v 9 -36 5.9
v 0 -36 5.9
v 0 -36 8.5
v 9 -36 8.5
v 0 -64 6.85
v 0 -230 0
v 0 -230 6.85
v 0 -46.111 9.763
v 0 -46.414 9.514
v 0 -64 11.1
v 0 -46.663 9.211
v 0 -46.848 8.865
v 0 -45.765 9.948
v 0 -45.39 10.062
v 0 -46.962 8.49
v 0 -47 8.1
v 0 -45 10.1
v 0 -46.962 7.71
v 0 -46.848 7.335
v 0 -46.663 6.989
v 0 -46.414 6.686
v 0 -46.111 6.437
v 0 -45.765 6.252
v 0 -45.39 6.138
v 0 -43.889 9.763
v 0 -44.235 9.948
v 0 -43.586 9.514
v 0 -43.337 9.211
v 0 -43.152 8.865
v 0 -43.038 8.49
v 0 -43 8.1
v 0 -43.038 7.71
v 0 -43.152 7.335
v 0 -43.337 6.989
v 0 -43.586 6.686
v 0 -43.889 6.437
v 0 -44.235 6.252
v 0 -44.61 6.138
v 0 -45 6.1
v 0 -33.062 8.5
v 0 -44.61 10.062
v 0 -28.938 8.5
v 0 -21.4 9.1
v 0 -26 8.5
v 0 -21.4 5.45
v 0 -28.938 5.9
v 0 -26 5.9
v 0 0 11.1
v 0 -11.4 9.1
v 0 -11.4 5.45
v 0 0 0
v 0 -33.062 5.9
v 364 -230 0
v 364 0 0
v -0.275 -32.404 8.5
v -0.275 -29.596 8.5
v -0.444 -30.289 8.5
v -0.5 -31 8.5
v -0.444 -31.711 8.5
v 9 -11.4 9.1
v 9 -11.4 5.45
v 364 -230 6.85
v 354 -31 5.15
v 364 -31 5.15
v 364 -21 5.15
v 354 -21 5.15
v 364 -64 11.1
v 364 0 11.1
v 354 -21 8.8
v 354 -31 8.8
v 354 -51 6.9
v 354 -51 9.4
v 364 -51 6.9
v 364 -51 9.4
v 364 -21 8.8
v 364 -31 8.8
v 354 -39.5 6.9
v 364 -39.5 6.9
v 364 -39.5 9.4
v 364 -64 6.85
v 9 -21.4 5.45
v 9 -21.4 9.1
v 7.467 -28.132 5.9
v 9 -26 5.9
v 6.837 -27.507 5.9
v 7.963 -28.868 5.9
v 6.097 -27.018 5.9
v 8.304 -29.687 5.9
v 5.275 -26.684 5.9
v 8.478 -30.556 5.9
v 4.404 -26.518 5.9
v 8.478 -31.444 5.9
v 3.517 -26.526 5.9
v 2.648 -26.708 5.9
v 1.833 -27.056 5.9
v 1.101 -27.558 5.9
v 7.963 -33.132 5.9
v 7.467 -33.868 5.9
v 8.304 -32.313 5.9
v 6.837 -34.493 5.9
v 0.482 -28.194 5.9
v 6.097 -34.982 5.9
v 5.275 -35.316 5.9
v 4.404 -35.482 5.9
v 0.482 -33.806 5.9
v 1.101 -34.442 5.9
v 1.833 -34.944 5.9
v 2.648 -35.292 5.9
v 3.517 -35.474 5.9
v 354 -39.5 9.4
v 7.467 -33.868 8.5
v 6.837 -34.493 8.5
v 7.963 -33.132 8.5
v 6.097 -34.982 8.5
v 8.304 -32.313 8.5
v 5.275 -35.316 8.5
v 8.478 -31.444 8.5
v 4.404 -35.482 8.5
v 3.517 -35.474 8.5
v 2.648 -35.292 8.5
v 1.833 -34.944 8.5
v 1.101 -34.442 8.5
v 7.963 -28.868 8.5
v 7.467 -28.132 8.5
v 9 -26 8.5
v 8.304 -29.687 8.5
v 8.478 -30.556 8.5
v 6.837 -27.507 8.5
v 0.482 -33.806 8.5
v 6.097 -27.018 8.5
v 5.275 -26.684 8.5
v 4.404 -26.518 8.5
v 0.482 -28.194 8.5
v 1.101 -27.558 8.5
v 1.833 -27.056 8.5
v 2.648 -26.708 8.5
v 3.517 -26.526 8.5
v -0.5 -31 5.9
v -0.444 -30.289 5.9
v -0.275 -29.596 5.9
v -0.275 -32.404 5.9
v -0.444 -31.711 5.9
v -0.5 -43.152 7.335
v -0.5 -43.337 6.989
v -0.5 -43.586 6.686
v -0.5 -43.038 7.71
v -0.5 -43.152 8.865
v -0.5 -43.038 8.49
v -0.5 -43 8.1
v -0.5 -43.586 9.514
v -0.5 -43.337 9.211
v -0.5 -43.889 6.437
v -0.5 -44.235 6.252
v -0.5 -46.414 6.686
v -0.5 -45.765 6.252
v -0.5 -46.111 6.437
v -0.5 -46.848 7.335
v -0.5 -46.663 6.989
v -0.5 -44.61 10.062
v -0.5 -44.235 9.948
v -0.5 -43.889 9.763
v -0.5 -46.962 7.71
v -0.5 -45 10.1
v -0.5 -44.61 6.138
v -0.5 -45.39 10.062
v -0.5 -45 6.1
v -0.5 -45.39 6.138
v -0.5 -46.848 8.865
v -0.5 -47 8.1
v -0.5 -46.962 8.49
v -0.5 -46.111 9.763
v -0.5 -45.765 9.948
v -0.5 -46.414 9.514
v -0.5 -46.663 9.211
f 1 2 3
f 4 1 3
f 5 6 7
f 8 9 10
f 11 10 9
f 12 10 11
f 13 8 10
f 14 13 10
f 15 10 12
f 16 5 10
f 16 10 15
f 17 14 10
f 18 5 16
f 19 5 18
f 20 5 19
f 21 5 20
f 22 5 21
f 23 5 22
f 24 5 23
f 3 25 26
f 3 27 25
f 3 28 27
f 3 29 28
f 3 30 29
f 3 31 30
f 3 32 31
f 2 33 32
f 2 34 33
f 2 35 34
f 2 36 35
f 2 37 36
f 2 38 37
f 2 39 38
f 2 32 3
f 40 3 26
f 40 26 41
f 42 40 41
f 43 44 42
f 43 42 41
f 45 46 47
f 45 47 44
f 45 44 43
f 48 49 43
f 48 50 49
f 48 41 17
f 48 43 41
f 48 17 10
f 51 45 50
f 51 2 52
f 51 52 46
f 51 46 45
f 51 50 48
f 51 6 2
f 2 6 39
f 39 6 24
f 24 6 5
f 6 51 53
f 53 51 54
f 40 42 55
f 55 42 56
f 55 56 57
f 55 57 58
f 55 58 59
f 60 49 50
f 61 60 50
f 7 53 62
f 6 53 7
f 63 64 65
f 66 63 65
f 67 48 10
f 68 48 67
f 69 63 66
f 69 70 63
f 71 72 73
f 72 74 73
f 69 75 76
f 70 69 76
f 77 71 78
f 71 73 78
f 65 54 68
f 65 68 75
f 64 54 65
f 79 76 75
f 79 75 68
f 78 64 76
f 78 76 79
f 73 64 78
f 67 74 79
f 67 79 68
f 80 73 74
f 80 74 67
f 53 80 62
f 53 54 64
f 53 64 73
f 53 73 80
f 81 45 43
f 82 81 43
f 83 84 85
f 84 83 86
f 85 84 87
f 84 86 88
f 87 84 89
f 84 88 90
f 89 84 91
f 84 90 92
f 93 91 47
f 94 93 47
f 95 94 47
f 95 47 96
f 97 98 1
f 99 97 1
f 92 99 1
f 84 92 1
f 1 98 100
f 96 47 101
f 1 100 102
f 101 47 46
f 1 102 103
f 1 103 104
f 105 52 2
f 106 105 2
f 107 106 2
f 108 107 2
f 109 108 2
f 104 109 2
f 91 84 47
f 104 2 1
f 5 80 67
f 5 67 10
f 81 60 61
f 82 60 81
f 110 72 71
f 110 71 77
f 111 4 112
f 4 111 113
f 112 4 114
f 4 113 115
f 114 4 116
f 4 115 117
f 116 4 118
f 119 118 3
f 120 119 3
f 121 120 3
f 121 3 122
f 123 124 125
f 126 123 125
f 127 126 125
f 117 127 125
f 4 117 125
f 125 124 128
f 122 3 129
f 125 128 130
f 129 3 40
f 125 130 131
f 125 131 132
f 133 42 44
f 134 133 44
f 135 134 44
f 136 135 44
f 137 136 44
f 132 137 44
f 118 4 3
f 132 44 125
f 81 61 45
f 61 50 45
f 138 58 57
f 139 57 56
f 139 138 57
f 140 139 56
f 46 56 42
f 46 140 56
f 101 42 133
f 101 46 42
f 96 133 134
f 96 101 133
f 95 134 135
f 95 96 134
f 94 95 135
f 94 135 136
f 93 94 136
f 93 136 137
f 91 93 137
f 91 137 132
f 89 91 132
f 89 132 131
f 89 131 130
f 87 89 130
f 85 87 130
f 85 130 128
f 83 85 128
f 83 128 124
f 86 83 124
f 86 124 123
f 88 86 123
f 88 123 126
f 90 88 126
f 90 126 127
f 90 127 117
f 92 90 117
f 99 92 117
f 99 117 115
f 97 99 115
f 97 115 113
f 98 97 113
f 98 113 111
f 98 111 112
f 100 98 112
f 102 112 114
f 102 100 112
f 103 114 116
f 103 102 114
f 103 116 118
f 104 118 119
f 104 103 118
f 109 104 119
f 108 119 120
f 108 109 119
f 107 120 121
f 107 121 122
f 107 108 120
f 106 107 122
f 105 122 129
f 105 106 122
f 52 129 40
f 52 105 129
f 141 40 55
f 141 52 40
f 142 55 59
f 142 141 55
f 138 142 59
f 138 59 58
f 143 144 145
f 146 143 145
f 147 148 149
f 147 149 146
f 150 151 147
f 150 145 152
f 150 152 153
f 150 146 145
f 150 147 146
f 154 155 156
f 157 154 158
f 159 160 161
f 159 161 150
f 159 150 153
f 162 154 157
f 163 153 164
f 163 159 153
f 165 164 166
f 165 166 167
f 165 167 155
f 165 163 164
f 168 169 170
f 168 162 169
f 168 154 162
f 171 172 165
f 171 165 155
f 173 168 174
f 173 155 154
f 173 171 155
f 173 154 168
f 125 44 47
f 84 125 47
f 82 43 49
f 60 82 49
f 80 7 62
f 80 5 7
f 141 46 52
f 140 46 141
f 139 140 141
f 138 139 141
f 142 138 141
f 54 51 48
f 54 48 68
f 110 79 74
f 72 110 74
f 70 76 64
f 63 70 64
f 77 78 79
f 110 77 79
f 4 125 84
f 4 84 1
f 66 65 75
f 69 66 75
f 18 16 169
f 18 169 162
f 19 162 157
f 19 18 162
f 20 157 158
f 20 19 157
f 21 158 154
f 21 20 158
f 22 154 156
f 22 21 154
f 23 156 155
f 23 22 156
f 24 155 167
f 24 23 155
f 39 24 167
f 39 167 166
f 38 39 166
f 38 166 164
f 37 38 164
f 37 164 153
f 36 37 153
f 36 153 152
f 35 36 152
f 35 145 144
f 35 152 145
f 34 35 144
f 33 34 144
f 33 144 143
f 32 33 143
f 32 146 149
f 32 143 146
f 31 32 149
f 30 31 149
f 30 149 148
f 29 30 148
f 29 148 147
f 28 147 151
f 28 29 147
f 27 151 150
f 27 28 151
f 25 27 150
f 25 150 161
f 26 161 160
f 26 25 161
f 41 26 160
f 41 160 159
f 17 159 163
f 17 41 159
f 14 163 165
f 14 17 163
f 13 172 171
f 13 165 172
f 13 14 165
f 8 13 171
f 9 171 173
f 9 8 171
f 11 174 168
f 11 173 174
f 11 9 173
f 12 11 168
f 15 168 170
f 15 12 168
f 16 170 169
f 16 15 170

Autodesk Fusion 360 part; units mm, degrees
sketch "Sketch1" plane through (0, 0, 0) normal (0, 0, 1) x (1, 0, 0)
  line L0 (0, 0) -> (364, 0)
  line L1 (364, 0) -> (364, -230)
  line L2 (364, -230) -> (0, -230)
  line L3 (0, -230) -> (0, 0)
  line L4 (364, -64) -> (0, -64)
extrude "Extrude1" add sketch "Sketch1" along normal blind 6.85 contours L1 L2 L3 L4
extrude "Extrude2" add sketch "Sketch1" along normal blind 11.1 contours L0 L1 L3 L4
sketch "Sketch2" plane through (0, 0, 0) normal (-1, 0, 0) x (0, -1, 0)
  line L0 (0, 0) -> (230, 0)
  line L1 (230, 0) -> (230, 6.85)
  line L2 (230, 6.85) -> (64, 6.85)
  line L3 (64, 6.85) -> (64, 11.1)
  line L4 (64, 11.1) -> (0, 11.1)
  line L5 (0, 11.1) -> (0, 0)
  circle A0 centre (45, 8.1) radius 2
  line L6 (36, 8.5) -> (26, 8.5)
  line L7 (26, 8.5) -> (26, 5.9)
  line L8 (26, 5.9) -> (36, 5.9)
  line L9 (36, 5.9) -> (36, 8.5)
  line L10 (21.4, 9.1) -> (11.4, 9.1)
  line L11 (11.4, 9.1) -> (11.4, 5.45)
  line L12 (11.4, 5.45) -> (21.4, 5.45)
  line L13 (21.4, 5.45) -> (21.4, 9.1)
  dimension "d10" = 4
extrude "Extrude3" add sketch "Sketch2" along normal blind 0.5 contours A0
extrude "Extrude4" cut sketch "Sketch2" against normal blind 9 contours L6 L7 L8 L9 | L10 L11 L12 L13
sketch "Sketch3" plane through (0, 0, 5.9) normal (0, 0, 1) x (-1, 0, 0)
  line L0 (0, 26) -> (0, 36)
  line L1 (0, 36) -> (-9, 36)
  line L2 (-9, 36) -> (-9, 26)
  line L3 (-9, 26) -> (0, 26)
  circle A0 centre (-4, 31) radius 4.5
extrude "Extrude5" add sketch "Sketch3" along normal blind 2.6 contours L0 A0 | L0 A0
sketch "Sketch4" plane through (364, 0, 0) normal (1, 0, 0) x (0, 1, 0)
  line L0 (-230, 0) -> (0, 0)
  line L1 (0, 0) -> (0, 11.1)
  line L2 (0, 11.1) -> (-64, 11.1)
  line L3 (-64, 11.1) -> (-64, 6.85)
  line L4 (-64, 6.85) -> (-230, 6.85)
  line L5 (-230, 6.85) -> (-230, 0)
  line L6 (-21, 8.8) -> (-31, 8.8)
  line L7 (-31, 8.8) -> (-31, 5.15)
  line L8 (-31, 5.15) -> (-21, 5.15)
  line L9 (-21, 5.15) -> (-21, 8.8)
  line L10 (-39.5, 9.4) -> (-51, 9.4)
  line L11 (-51, 9.4) -> (-51, 6.9)
  line L12 (-51, 6.9) -> (-39.5, 6.9)
  line L13 (-39.5, 6.9) -> (-39.5, 9.4)
extrude "Extrude6" cut sketch "Sketch4" against normal blind 10 contours L6 L7 L8 L9 | L10 L11 L12 L13
